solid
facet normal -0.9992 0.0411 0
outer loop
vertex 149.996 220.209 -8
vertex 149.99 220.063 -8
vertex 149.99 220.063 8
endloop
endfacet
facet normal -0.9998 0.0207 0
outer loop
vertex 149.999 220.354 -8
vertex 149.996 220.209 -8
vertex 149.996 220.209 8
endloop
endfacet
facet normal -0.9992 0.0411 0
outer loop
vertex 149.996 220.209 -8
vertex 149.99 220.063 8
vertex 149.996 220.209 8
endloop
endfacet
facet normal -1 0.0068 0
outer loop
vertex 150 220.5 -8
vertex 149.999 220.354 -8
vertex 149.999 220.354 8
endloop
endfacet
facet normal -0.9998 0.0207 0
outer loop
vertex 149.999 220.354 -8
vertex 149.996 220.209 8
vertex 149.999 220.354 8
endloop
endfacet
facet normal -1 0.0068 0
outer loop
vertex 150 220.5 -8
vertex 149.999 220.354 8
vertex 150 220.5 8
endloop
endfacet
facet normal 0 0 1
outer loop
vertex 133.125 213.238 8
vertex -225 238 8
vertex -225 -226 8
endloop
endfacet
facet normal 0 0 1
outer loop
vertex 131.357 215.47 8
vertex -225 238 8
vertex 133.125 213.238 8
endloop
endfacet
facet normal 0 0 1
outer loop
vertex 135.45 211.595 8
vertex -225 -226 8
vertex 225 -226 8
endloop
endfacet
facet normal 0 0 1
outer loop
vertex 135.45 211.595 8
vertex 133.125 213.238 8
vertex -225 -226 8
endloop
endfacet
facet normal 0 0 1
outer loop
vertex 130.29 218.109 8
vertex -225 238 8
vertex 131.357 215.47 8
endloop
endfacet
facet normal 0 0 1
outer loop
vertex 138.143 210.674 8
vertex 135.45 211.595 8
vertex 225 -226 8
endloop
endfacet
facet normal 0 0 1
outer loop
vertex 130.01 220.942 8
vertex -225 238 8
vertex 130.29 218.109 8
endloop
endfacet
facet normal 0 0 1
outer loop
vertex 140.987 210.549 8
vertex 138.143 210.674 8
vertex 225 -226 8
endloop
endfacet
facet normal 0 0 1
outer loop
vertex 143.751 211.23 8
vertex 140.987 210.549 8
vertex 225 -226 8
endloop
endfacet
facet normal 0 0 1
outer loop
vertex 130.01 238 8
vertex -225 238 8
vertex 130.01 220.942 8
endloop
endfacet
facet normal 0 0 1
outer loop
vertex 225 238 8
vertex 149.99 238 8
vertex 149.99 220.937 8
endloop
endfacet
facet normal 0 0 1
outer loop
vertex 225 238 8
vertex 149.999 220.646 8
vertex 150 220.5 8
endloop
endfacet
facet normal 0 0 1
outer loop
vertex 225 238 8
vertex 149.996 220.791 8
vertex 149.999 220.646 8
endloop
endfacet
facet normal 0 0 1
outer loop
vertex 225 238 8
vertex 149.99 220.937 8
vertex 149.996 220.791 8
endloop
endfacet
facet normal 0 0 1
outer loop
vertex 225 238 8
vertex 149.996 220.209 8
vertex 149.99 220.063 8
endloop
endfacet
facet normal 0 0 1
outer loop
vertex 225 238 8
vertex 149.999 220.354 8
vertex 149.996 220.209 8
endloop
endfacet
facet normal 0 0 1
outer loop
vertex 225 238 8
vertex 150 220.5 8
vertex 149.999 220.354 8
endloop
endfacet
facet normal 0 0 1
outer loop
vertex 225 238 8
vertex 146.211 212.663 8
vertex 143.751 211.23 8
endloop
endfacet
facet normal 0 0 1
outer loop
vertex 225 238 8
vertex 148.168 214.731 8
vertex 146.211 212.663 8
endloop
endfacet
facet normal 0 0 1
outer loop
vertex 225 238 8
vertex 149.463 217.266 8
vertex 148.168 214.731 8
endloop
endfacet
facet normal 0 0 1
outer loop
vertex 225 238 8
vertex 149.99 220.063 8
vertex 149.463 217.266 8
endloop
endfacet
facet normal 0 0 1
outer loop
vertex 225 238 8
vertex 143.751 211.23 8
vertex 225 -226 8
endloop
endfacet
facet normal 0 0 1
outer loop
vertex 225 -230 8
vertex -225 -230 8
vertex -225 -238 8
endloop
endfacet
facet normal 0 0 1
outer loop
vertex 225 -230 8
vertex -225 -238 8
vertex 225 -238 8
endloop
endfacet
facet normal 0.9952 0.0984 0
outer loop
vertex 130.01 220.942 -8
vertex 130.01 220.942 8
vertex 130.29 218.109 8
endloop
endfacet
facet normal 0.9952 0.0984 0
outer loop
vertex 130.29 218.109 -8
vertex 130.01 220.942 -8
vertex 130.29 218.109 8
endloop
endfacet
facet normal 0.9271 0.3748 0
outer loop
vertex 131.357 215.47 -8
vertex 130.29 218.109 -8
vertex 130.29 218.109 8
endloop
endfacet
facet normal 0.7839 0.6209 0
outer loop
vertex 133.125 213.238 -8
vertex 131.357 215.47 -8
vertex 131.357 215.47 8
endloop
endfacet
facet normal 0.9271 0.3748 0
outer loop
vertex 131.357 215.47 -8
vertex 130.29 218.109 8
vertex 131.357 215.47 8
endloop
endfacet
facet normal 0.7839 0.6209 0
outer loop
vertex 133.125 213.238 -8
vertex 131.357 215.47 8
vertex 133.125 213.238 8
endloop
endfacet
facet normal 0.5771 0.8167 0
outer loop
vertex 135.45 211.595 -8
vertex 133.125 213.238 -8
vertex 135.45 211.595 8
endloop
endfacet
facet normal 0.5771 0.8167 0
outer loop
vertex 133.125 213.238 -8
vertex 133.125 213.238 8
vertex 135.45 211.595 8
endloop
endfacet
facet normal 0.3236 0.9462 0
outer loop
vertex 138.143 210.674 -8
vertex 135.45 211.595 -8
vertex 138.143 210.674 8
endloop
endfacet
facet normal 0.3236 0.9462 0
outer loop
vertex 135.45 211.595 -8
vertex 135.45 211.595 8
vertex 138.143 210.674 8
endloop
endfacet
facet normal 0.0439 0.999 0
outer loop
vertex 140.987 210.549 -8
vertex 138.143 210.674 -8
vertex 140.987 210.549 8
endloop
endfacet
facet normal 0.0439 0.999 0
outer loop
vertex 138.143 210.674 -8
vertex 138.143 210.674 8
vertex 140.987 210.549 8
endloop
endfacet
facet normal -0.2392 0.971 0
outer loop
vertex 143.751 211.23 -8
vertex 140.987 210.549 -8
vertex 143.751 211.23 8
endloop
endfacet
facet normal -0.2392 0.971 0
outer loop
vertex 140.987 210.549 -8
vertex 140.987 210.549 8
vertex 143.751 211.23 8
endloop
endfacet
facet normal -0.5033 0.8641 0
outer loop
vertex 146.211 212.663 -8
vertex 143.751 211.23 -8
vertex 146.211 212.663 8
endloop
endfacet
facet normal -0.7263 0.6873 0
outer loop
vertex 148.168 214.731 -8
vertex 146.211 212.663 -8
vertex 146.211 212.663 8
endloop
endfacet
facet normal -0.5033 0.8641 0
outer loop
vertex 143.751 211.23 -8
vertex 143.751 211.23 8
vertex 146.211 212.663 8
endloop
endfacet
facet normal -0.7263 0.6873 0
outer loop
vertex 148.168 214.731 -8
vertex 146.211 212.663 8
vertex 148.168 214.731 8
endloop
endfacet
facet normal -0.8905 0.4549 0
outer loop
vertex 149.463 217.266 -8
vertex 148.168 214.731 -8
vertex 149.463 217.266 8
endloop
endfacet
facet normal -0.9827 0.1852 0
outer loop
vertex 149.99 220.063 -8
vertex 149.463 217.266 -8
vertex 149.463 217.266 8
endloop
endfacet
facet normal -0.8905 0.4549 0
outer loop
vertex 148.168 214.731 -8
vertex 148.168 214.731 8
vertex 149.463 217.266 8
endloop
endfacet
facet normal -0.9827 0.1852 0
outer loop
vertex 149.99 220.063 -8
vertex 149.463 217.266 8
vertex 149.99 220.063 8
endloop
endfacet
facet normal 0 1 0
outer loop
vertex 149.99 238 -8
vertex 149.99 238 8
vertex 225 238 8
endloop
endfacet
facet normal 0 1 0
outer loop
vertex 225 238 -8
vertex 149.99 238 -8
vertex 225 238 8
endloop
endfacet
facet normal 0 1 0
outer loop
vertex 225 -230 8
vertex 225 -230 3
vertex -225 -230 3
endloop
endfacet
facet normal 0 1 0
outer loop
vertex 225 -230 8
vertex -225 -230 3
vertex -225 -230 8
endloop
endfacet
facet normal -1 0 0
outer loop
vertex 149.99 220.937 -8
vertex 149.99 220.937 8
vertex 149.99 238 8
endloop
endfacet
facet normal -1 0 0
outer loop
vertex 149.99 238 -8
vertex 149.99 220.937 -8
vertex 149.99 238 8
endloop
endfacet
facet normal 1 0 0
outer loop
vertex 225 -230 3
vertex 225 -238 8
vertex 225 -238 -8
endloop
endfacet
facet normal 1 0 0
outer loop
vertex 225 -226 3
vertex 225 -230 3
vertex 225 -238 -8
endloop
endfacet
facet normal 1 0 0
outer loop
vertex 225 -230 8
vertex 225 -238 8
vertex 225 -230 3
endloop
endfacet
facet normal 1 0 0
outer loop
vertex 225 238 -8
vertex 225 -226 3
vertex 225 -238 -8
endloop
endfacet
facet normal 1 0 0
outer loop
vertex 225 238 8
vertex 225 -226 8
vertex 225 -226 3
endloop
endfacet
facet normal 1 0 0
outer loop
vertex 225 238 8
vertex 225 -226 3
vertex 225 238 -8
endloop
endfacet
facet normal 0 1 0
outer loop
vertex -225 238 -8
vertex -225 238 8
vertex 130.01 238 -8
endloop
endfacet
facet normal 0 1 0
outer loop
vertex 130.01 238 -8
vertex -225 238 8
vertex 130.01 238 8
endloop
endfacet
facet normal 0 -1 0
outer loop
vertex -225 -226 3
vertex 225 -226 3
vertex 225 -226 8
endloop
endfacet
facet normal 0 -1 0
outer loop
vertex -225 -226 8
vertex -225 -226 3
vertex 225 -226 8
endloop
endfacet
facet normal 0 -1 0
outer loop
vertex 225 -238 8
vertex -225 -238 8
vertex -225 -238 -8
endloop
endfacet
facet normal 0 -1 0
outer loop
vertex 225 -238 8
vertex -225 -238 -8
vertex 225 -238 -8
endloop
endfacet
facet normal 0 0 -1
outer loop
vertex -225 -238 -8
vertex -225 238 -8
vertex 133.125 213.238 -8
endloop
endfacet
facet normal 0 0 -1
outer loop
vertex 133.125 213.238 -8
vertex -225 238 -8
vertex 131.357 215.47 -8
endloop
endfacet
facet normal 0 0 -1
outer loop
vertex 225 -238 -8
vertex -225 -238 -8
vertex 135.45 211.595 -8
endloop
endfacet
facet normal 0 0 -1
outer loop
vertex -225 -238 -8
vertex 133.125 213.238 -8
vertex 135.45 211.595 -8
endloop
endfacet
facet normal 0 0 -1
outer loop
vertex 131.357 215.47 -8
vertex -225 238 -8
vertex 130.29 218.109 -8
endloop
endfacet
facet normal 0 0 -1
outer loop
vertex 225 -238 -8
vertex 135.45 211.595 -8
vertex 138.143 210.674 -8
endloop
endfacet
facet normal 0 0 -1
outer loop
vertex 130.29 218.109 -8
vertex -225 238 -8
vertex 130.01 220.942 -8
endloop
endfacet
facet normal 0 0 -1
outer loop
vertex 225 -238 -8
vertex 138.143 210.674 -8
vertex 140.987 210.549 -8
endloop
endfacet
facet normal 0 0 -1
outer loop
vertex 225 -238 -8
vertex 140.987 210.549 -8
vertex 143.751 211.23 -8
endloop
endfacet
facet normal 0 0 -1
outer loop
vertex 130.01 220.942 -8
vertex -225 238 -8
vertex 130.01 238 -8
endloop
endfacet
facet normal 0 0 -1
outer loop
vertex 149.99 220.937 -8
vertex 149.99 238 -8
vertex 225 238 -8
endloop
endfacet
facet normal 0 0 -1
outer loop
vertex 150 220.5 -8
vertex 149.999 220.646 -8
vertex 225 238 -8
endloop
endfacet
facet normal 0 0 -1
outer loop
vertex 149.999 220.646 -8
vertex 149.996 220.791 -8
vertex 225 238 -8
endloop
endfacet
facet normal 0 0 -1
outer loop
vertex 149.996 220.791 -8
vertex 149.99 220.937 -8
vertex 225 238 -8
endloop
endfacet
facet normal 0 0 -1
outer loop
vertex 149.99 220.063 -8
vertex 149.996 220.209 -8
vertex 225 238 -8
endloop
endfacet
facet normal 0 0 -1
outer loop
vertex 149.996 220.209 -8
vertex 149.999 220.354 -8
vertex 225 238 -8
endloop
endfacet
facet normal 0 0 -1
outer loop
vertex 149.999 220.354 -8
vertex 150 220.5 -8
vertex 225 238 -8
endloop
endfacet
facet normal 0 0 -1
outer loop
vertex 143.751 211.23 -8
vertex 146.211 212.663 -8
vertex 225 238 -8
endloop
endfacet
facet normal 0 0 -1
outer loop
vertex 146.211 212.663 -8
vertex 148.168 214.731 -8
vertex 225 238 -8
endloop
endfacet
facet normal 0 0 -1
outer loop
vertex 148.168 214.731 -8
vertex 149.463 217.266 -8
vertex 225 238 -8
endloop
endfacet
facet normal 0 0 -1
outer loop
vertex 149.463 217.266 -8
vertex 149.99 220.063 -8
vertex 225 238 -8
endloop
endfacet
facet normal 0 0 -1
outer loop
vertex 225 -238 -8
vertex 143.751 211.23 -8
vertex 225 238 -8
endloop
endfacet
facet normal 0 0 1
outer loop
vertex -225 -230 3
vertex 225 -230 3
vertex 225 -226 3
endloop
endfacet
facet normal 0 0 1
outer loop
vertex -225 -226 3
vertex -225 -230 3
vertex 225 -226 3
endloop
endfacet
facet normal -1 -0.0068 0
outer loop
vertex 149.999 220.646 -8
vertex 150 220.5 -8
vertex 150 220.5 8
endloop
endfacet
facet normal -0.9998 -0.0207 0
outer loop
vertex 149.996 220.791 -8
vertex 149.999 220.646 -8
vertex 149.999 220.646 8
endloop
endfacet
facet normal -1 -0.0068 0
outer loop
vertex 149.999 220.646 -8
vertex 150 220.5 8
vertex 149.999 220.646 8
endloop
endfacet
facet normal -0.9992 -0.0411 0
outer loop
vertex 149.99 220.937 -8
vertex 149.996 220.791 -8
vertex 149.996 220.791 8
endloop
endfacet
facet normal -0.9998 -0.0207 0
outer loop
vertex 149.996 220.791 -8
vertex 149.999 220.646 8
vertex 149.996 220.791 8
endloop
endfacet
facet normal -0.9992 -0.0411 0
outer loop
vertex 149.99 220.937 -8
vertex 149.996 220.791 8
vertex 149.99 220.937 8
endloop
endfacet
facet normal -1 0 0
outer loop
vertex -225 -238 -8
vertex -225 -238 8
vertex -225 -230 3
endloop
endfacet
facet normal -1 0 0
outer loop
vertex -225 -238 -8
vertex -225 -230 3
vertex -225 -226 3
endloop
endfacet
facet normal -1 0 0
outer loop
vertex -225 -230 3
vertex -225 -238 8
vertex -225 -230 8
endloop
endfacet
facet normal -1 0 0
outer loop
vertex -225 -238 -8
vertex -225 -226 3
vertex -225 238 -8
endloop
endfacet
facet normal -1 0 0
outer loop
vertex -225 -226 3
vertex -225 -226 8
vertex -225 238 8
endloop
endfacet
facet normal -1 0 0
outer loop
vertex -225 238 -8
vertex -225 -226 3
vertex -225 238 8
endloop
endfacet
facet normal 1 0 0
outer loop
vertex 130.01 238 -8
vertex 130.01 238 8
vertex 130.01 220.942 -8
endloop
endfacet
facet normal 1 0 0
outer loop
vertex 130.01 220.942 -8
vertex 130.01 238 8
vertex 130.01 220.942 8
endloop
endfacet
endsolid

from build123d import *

# Parameters (mm, degrees)
F0_W     = 450
F0_H     = 476
F1_DEPTH = 8
F3_DEPTH = 16.001
F4_W     = 4
F4_H     = 5
F5_DEPTH = 450.001


# Not quite as in the source:
# - a feature names something its author has since deleted; it is built from what else it names


with BuildPart() as f1:
    # F0 (on Top) → F1 (new body, symmetric)
    with BuildSketch(Plane.XY):
        Rectangle(F0_W, F0_H)
    extrude(amount=F1_DEPTH, both=True)

    # F2 (on face) → F3 (cut, through all)
    with BuildSketch(Plane.XY.offset(8)):
        with BuildLine():
            ThreePointArc((149.9904602378, 220.9366969629), (140.0025066822, 230.4999996858), (130.0097599498, 220.9417054897))
            ThreePointArc((130.0097599498, 220.9417054897), (139.5607987599, 210.5096495421), (149.9904602378, 220.0633030371))
            Line((149.9904602378, 220.0633030371), (149.9904602378, 220.9366969629))
        make_face()
        with BuildLine():
            Line((149.9904602378, 220.9366969629), (149.9904602378, 220.0633030371))
            ThreePointArc((149.9904602378, 220.0633030371), (149.997614775, 220.2815994251), (150, 220.5))
            ThreePointArc((150, 220.5), (149.997614775, 220.7184005749), (149.9904602378, 220.9366969629))
        make_face()
        with BuildLine():
            Line((130.0097599498, 238), (130.0097599498, 220.9417054897))
            ThreePointArc((130.0097599498, 220.9417054897), (140.0025066822, 230.4999996858), (149.9904602378, 220.9366969629))
            Line((149.9904602378, 220.9366969629), (149.9904602378, 238))
            Line((149.9904602378, 238), (130.0097599498, 238))
        make_face()
    extrude(amount=-F3_DEPTH, mode=Mode.SUBTRACT)

    # F4 (on face) → F5 (cut, through all)
    with BuildSketch(Plane.YZ.offset(225)):
        with Locations((-228, 5.5)):
            Rectangle(F4_W, F4_H)
    extrude(amount=-F5_DEPTH, mode=Mode.SUBTRACT)


solid = f1.part
